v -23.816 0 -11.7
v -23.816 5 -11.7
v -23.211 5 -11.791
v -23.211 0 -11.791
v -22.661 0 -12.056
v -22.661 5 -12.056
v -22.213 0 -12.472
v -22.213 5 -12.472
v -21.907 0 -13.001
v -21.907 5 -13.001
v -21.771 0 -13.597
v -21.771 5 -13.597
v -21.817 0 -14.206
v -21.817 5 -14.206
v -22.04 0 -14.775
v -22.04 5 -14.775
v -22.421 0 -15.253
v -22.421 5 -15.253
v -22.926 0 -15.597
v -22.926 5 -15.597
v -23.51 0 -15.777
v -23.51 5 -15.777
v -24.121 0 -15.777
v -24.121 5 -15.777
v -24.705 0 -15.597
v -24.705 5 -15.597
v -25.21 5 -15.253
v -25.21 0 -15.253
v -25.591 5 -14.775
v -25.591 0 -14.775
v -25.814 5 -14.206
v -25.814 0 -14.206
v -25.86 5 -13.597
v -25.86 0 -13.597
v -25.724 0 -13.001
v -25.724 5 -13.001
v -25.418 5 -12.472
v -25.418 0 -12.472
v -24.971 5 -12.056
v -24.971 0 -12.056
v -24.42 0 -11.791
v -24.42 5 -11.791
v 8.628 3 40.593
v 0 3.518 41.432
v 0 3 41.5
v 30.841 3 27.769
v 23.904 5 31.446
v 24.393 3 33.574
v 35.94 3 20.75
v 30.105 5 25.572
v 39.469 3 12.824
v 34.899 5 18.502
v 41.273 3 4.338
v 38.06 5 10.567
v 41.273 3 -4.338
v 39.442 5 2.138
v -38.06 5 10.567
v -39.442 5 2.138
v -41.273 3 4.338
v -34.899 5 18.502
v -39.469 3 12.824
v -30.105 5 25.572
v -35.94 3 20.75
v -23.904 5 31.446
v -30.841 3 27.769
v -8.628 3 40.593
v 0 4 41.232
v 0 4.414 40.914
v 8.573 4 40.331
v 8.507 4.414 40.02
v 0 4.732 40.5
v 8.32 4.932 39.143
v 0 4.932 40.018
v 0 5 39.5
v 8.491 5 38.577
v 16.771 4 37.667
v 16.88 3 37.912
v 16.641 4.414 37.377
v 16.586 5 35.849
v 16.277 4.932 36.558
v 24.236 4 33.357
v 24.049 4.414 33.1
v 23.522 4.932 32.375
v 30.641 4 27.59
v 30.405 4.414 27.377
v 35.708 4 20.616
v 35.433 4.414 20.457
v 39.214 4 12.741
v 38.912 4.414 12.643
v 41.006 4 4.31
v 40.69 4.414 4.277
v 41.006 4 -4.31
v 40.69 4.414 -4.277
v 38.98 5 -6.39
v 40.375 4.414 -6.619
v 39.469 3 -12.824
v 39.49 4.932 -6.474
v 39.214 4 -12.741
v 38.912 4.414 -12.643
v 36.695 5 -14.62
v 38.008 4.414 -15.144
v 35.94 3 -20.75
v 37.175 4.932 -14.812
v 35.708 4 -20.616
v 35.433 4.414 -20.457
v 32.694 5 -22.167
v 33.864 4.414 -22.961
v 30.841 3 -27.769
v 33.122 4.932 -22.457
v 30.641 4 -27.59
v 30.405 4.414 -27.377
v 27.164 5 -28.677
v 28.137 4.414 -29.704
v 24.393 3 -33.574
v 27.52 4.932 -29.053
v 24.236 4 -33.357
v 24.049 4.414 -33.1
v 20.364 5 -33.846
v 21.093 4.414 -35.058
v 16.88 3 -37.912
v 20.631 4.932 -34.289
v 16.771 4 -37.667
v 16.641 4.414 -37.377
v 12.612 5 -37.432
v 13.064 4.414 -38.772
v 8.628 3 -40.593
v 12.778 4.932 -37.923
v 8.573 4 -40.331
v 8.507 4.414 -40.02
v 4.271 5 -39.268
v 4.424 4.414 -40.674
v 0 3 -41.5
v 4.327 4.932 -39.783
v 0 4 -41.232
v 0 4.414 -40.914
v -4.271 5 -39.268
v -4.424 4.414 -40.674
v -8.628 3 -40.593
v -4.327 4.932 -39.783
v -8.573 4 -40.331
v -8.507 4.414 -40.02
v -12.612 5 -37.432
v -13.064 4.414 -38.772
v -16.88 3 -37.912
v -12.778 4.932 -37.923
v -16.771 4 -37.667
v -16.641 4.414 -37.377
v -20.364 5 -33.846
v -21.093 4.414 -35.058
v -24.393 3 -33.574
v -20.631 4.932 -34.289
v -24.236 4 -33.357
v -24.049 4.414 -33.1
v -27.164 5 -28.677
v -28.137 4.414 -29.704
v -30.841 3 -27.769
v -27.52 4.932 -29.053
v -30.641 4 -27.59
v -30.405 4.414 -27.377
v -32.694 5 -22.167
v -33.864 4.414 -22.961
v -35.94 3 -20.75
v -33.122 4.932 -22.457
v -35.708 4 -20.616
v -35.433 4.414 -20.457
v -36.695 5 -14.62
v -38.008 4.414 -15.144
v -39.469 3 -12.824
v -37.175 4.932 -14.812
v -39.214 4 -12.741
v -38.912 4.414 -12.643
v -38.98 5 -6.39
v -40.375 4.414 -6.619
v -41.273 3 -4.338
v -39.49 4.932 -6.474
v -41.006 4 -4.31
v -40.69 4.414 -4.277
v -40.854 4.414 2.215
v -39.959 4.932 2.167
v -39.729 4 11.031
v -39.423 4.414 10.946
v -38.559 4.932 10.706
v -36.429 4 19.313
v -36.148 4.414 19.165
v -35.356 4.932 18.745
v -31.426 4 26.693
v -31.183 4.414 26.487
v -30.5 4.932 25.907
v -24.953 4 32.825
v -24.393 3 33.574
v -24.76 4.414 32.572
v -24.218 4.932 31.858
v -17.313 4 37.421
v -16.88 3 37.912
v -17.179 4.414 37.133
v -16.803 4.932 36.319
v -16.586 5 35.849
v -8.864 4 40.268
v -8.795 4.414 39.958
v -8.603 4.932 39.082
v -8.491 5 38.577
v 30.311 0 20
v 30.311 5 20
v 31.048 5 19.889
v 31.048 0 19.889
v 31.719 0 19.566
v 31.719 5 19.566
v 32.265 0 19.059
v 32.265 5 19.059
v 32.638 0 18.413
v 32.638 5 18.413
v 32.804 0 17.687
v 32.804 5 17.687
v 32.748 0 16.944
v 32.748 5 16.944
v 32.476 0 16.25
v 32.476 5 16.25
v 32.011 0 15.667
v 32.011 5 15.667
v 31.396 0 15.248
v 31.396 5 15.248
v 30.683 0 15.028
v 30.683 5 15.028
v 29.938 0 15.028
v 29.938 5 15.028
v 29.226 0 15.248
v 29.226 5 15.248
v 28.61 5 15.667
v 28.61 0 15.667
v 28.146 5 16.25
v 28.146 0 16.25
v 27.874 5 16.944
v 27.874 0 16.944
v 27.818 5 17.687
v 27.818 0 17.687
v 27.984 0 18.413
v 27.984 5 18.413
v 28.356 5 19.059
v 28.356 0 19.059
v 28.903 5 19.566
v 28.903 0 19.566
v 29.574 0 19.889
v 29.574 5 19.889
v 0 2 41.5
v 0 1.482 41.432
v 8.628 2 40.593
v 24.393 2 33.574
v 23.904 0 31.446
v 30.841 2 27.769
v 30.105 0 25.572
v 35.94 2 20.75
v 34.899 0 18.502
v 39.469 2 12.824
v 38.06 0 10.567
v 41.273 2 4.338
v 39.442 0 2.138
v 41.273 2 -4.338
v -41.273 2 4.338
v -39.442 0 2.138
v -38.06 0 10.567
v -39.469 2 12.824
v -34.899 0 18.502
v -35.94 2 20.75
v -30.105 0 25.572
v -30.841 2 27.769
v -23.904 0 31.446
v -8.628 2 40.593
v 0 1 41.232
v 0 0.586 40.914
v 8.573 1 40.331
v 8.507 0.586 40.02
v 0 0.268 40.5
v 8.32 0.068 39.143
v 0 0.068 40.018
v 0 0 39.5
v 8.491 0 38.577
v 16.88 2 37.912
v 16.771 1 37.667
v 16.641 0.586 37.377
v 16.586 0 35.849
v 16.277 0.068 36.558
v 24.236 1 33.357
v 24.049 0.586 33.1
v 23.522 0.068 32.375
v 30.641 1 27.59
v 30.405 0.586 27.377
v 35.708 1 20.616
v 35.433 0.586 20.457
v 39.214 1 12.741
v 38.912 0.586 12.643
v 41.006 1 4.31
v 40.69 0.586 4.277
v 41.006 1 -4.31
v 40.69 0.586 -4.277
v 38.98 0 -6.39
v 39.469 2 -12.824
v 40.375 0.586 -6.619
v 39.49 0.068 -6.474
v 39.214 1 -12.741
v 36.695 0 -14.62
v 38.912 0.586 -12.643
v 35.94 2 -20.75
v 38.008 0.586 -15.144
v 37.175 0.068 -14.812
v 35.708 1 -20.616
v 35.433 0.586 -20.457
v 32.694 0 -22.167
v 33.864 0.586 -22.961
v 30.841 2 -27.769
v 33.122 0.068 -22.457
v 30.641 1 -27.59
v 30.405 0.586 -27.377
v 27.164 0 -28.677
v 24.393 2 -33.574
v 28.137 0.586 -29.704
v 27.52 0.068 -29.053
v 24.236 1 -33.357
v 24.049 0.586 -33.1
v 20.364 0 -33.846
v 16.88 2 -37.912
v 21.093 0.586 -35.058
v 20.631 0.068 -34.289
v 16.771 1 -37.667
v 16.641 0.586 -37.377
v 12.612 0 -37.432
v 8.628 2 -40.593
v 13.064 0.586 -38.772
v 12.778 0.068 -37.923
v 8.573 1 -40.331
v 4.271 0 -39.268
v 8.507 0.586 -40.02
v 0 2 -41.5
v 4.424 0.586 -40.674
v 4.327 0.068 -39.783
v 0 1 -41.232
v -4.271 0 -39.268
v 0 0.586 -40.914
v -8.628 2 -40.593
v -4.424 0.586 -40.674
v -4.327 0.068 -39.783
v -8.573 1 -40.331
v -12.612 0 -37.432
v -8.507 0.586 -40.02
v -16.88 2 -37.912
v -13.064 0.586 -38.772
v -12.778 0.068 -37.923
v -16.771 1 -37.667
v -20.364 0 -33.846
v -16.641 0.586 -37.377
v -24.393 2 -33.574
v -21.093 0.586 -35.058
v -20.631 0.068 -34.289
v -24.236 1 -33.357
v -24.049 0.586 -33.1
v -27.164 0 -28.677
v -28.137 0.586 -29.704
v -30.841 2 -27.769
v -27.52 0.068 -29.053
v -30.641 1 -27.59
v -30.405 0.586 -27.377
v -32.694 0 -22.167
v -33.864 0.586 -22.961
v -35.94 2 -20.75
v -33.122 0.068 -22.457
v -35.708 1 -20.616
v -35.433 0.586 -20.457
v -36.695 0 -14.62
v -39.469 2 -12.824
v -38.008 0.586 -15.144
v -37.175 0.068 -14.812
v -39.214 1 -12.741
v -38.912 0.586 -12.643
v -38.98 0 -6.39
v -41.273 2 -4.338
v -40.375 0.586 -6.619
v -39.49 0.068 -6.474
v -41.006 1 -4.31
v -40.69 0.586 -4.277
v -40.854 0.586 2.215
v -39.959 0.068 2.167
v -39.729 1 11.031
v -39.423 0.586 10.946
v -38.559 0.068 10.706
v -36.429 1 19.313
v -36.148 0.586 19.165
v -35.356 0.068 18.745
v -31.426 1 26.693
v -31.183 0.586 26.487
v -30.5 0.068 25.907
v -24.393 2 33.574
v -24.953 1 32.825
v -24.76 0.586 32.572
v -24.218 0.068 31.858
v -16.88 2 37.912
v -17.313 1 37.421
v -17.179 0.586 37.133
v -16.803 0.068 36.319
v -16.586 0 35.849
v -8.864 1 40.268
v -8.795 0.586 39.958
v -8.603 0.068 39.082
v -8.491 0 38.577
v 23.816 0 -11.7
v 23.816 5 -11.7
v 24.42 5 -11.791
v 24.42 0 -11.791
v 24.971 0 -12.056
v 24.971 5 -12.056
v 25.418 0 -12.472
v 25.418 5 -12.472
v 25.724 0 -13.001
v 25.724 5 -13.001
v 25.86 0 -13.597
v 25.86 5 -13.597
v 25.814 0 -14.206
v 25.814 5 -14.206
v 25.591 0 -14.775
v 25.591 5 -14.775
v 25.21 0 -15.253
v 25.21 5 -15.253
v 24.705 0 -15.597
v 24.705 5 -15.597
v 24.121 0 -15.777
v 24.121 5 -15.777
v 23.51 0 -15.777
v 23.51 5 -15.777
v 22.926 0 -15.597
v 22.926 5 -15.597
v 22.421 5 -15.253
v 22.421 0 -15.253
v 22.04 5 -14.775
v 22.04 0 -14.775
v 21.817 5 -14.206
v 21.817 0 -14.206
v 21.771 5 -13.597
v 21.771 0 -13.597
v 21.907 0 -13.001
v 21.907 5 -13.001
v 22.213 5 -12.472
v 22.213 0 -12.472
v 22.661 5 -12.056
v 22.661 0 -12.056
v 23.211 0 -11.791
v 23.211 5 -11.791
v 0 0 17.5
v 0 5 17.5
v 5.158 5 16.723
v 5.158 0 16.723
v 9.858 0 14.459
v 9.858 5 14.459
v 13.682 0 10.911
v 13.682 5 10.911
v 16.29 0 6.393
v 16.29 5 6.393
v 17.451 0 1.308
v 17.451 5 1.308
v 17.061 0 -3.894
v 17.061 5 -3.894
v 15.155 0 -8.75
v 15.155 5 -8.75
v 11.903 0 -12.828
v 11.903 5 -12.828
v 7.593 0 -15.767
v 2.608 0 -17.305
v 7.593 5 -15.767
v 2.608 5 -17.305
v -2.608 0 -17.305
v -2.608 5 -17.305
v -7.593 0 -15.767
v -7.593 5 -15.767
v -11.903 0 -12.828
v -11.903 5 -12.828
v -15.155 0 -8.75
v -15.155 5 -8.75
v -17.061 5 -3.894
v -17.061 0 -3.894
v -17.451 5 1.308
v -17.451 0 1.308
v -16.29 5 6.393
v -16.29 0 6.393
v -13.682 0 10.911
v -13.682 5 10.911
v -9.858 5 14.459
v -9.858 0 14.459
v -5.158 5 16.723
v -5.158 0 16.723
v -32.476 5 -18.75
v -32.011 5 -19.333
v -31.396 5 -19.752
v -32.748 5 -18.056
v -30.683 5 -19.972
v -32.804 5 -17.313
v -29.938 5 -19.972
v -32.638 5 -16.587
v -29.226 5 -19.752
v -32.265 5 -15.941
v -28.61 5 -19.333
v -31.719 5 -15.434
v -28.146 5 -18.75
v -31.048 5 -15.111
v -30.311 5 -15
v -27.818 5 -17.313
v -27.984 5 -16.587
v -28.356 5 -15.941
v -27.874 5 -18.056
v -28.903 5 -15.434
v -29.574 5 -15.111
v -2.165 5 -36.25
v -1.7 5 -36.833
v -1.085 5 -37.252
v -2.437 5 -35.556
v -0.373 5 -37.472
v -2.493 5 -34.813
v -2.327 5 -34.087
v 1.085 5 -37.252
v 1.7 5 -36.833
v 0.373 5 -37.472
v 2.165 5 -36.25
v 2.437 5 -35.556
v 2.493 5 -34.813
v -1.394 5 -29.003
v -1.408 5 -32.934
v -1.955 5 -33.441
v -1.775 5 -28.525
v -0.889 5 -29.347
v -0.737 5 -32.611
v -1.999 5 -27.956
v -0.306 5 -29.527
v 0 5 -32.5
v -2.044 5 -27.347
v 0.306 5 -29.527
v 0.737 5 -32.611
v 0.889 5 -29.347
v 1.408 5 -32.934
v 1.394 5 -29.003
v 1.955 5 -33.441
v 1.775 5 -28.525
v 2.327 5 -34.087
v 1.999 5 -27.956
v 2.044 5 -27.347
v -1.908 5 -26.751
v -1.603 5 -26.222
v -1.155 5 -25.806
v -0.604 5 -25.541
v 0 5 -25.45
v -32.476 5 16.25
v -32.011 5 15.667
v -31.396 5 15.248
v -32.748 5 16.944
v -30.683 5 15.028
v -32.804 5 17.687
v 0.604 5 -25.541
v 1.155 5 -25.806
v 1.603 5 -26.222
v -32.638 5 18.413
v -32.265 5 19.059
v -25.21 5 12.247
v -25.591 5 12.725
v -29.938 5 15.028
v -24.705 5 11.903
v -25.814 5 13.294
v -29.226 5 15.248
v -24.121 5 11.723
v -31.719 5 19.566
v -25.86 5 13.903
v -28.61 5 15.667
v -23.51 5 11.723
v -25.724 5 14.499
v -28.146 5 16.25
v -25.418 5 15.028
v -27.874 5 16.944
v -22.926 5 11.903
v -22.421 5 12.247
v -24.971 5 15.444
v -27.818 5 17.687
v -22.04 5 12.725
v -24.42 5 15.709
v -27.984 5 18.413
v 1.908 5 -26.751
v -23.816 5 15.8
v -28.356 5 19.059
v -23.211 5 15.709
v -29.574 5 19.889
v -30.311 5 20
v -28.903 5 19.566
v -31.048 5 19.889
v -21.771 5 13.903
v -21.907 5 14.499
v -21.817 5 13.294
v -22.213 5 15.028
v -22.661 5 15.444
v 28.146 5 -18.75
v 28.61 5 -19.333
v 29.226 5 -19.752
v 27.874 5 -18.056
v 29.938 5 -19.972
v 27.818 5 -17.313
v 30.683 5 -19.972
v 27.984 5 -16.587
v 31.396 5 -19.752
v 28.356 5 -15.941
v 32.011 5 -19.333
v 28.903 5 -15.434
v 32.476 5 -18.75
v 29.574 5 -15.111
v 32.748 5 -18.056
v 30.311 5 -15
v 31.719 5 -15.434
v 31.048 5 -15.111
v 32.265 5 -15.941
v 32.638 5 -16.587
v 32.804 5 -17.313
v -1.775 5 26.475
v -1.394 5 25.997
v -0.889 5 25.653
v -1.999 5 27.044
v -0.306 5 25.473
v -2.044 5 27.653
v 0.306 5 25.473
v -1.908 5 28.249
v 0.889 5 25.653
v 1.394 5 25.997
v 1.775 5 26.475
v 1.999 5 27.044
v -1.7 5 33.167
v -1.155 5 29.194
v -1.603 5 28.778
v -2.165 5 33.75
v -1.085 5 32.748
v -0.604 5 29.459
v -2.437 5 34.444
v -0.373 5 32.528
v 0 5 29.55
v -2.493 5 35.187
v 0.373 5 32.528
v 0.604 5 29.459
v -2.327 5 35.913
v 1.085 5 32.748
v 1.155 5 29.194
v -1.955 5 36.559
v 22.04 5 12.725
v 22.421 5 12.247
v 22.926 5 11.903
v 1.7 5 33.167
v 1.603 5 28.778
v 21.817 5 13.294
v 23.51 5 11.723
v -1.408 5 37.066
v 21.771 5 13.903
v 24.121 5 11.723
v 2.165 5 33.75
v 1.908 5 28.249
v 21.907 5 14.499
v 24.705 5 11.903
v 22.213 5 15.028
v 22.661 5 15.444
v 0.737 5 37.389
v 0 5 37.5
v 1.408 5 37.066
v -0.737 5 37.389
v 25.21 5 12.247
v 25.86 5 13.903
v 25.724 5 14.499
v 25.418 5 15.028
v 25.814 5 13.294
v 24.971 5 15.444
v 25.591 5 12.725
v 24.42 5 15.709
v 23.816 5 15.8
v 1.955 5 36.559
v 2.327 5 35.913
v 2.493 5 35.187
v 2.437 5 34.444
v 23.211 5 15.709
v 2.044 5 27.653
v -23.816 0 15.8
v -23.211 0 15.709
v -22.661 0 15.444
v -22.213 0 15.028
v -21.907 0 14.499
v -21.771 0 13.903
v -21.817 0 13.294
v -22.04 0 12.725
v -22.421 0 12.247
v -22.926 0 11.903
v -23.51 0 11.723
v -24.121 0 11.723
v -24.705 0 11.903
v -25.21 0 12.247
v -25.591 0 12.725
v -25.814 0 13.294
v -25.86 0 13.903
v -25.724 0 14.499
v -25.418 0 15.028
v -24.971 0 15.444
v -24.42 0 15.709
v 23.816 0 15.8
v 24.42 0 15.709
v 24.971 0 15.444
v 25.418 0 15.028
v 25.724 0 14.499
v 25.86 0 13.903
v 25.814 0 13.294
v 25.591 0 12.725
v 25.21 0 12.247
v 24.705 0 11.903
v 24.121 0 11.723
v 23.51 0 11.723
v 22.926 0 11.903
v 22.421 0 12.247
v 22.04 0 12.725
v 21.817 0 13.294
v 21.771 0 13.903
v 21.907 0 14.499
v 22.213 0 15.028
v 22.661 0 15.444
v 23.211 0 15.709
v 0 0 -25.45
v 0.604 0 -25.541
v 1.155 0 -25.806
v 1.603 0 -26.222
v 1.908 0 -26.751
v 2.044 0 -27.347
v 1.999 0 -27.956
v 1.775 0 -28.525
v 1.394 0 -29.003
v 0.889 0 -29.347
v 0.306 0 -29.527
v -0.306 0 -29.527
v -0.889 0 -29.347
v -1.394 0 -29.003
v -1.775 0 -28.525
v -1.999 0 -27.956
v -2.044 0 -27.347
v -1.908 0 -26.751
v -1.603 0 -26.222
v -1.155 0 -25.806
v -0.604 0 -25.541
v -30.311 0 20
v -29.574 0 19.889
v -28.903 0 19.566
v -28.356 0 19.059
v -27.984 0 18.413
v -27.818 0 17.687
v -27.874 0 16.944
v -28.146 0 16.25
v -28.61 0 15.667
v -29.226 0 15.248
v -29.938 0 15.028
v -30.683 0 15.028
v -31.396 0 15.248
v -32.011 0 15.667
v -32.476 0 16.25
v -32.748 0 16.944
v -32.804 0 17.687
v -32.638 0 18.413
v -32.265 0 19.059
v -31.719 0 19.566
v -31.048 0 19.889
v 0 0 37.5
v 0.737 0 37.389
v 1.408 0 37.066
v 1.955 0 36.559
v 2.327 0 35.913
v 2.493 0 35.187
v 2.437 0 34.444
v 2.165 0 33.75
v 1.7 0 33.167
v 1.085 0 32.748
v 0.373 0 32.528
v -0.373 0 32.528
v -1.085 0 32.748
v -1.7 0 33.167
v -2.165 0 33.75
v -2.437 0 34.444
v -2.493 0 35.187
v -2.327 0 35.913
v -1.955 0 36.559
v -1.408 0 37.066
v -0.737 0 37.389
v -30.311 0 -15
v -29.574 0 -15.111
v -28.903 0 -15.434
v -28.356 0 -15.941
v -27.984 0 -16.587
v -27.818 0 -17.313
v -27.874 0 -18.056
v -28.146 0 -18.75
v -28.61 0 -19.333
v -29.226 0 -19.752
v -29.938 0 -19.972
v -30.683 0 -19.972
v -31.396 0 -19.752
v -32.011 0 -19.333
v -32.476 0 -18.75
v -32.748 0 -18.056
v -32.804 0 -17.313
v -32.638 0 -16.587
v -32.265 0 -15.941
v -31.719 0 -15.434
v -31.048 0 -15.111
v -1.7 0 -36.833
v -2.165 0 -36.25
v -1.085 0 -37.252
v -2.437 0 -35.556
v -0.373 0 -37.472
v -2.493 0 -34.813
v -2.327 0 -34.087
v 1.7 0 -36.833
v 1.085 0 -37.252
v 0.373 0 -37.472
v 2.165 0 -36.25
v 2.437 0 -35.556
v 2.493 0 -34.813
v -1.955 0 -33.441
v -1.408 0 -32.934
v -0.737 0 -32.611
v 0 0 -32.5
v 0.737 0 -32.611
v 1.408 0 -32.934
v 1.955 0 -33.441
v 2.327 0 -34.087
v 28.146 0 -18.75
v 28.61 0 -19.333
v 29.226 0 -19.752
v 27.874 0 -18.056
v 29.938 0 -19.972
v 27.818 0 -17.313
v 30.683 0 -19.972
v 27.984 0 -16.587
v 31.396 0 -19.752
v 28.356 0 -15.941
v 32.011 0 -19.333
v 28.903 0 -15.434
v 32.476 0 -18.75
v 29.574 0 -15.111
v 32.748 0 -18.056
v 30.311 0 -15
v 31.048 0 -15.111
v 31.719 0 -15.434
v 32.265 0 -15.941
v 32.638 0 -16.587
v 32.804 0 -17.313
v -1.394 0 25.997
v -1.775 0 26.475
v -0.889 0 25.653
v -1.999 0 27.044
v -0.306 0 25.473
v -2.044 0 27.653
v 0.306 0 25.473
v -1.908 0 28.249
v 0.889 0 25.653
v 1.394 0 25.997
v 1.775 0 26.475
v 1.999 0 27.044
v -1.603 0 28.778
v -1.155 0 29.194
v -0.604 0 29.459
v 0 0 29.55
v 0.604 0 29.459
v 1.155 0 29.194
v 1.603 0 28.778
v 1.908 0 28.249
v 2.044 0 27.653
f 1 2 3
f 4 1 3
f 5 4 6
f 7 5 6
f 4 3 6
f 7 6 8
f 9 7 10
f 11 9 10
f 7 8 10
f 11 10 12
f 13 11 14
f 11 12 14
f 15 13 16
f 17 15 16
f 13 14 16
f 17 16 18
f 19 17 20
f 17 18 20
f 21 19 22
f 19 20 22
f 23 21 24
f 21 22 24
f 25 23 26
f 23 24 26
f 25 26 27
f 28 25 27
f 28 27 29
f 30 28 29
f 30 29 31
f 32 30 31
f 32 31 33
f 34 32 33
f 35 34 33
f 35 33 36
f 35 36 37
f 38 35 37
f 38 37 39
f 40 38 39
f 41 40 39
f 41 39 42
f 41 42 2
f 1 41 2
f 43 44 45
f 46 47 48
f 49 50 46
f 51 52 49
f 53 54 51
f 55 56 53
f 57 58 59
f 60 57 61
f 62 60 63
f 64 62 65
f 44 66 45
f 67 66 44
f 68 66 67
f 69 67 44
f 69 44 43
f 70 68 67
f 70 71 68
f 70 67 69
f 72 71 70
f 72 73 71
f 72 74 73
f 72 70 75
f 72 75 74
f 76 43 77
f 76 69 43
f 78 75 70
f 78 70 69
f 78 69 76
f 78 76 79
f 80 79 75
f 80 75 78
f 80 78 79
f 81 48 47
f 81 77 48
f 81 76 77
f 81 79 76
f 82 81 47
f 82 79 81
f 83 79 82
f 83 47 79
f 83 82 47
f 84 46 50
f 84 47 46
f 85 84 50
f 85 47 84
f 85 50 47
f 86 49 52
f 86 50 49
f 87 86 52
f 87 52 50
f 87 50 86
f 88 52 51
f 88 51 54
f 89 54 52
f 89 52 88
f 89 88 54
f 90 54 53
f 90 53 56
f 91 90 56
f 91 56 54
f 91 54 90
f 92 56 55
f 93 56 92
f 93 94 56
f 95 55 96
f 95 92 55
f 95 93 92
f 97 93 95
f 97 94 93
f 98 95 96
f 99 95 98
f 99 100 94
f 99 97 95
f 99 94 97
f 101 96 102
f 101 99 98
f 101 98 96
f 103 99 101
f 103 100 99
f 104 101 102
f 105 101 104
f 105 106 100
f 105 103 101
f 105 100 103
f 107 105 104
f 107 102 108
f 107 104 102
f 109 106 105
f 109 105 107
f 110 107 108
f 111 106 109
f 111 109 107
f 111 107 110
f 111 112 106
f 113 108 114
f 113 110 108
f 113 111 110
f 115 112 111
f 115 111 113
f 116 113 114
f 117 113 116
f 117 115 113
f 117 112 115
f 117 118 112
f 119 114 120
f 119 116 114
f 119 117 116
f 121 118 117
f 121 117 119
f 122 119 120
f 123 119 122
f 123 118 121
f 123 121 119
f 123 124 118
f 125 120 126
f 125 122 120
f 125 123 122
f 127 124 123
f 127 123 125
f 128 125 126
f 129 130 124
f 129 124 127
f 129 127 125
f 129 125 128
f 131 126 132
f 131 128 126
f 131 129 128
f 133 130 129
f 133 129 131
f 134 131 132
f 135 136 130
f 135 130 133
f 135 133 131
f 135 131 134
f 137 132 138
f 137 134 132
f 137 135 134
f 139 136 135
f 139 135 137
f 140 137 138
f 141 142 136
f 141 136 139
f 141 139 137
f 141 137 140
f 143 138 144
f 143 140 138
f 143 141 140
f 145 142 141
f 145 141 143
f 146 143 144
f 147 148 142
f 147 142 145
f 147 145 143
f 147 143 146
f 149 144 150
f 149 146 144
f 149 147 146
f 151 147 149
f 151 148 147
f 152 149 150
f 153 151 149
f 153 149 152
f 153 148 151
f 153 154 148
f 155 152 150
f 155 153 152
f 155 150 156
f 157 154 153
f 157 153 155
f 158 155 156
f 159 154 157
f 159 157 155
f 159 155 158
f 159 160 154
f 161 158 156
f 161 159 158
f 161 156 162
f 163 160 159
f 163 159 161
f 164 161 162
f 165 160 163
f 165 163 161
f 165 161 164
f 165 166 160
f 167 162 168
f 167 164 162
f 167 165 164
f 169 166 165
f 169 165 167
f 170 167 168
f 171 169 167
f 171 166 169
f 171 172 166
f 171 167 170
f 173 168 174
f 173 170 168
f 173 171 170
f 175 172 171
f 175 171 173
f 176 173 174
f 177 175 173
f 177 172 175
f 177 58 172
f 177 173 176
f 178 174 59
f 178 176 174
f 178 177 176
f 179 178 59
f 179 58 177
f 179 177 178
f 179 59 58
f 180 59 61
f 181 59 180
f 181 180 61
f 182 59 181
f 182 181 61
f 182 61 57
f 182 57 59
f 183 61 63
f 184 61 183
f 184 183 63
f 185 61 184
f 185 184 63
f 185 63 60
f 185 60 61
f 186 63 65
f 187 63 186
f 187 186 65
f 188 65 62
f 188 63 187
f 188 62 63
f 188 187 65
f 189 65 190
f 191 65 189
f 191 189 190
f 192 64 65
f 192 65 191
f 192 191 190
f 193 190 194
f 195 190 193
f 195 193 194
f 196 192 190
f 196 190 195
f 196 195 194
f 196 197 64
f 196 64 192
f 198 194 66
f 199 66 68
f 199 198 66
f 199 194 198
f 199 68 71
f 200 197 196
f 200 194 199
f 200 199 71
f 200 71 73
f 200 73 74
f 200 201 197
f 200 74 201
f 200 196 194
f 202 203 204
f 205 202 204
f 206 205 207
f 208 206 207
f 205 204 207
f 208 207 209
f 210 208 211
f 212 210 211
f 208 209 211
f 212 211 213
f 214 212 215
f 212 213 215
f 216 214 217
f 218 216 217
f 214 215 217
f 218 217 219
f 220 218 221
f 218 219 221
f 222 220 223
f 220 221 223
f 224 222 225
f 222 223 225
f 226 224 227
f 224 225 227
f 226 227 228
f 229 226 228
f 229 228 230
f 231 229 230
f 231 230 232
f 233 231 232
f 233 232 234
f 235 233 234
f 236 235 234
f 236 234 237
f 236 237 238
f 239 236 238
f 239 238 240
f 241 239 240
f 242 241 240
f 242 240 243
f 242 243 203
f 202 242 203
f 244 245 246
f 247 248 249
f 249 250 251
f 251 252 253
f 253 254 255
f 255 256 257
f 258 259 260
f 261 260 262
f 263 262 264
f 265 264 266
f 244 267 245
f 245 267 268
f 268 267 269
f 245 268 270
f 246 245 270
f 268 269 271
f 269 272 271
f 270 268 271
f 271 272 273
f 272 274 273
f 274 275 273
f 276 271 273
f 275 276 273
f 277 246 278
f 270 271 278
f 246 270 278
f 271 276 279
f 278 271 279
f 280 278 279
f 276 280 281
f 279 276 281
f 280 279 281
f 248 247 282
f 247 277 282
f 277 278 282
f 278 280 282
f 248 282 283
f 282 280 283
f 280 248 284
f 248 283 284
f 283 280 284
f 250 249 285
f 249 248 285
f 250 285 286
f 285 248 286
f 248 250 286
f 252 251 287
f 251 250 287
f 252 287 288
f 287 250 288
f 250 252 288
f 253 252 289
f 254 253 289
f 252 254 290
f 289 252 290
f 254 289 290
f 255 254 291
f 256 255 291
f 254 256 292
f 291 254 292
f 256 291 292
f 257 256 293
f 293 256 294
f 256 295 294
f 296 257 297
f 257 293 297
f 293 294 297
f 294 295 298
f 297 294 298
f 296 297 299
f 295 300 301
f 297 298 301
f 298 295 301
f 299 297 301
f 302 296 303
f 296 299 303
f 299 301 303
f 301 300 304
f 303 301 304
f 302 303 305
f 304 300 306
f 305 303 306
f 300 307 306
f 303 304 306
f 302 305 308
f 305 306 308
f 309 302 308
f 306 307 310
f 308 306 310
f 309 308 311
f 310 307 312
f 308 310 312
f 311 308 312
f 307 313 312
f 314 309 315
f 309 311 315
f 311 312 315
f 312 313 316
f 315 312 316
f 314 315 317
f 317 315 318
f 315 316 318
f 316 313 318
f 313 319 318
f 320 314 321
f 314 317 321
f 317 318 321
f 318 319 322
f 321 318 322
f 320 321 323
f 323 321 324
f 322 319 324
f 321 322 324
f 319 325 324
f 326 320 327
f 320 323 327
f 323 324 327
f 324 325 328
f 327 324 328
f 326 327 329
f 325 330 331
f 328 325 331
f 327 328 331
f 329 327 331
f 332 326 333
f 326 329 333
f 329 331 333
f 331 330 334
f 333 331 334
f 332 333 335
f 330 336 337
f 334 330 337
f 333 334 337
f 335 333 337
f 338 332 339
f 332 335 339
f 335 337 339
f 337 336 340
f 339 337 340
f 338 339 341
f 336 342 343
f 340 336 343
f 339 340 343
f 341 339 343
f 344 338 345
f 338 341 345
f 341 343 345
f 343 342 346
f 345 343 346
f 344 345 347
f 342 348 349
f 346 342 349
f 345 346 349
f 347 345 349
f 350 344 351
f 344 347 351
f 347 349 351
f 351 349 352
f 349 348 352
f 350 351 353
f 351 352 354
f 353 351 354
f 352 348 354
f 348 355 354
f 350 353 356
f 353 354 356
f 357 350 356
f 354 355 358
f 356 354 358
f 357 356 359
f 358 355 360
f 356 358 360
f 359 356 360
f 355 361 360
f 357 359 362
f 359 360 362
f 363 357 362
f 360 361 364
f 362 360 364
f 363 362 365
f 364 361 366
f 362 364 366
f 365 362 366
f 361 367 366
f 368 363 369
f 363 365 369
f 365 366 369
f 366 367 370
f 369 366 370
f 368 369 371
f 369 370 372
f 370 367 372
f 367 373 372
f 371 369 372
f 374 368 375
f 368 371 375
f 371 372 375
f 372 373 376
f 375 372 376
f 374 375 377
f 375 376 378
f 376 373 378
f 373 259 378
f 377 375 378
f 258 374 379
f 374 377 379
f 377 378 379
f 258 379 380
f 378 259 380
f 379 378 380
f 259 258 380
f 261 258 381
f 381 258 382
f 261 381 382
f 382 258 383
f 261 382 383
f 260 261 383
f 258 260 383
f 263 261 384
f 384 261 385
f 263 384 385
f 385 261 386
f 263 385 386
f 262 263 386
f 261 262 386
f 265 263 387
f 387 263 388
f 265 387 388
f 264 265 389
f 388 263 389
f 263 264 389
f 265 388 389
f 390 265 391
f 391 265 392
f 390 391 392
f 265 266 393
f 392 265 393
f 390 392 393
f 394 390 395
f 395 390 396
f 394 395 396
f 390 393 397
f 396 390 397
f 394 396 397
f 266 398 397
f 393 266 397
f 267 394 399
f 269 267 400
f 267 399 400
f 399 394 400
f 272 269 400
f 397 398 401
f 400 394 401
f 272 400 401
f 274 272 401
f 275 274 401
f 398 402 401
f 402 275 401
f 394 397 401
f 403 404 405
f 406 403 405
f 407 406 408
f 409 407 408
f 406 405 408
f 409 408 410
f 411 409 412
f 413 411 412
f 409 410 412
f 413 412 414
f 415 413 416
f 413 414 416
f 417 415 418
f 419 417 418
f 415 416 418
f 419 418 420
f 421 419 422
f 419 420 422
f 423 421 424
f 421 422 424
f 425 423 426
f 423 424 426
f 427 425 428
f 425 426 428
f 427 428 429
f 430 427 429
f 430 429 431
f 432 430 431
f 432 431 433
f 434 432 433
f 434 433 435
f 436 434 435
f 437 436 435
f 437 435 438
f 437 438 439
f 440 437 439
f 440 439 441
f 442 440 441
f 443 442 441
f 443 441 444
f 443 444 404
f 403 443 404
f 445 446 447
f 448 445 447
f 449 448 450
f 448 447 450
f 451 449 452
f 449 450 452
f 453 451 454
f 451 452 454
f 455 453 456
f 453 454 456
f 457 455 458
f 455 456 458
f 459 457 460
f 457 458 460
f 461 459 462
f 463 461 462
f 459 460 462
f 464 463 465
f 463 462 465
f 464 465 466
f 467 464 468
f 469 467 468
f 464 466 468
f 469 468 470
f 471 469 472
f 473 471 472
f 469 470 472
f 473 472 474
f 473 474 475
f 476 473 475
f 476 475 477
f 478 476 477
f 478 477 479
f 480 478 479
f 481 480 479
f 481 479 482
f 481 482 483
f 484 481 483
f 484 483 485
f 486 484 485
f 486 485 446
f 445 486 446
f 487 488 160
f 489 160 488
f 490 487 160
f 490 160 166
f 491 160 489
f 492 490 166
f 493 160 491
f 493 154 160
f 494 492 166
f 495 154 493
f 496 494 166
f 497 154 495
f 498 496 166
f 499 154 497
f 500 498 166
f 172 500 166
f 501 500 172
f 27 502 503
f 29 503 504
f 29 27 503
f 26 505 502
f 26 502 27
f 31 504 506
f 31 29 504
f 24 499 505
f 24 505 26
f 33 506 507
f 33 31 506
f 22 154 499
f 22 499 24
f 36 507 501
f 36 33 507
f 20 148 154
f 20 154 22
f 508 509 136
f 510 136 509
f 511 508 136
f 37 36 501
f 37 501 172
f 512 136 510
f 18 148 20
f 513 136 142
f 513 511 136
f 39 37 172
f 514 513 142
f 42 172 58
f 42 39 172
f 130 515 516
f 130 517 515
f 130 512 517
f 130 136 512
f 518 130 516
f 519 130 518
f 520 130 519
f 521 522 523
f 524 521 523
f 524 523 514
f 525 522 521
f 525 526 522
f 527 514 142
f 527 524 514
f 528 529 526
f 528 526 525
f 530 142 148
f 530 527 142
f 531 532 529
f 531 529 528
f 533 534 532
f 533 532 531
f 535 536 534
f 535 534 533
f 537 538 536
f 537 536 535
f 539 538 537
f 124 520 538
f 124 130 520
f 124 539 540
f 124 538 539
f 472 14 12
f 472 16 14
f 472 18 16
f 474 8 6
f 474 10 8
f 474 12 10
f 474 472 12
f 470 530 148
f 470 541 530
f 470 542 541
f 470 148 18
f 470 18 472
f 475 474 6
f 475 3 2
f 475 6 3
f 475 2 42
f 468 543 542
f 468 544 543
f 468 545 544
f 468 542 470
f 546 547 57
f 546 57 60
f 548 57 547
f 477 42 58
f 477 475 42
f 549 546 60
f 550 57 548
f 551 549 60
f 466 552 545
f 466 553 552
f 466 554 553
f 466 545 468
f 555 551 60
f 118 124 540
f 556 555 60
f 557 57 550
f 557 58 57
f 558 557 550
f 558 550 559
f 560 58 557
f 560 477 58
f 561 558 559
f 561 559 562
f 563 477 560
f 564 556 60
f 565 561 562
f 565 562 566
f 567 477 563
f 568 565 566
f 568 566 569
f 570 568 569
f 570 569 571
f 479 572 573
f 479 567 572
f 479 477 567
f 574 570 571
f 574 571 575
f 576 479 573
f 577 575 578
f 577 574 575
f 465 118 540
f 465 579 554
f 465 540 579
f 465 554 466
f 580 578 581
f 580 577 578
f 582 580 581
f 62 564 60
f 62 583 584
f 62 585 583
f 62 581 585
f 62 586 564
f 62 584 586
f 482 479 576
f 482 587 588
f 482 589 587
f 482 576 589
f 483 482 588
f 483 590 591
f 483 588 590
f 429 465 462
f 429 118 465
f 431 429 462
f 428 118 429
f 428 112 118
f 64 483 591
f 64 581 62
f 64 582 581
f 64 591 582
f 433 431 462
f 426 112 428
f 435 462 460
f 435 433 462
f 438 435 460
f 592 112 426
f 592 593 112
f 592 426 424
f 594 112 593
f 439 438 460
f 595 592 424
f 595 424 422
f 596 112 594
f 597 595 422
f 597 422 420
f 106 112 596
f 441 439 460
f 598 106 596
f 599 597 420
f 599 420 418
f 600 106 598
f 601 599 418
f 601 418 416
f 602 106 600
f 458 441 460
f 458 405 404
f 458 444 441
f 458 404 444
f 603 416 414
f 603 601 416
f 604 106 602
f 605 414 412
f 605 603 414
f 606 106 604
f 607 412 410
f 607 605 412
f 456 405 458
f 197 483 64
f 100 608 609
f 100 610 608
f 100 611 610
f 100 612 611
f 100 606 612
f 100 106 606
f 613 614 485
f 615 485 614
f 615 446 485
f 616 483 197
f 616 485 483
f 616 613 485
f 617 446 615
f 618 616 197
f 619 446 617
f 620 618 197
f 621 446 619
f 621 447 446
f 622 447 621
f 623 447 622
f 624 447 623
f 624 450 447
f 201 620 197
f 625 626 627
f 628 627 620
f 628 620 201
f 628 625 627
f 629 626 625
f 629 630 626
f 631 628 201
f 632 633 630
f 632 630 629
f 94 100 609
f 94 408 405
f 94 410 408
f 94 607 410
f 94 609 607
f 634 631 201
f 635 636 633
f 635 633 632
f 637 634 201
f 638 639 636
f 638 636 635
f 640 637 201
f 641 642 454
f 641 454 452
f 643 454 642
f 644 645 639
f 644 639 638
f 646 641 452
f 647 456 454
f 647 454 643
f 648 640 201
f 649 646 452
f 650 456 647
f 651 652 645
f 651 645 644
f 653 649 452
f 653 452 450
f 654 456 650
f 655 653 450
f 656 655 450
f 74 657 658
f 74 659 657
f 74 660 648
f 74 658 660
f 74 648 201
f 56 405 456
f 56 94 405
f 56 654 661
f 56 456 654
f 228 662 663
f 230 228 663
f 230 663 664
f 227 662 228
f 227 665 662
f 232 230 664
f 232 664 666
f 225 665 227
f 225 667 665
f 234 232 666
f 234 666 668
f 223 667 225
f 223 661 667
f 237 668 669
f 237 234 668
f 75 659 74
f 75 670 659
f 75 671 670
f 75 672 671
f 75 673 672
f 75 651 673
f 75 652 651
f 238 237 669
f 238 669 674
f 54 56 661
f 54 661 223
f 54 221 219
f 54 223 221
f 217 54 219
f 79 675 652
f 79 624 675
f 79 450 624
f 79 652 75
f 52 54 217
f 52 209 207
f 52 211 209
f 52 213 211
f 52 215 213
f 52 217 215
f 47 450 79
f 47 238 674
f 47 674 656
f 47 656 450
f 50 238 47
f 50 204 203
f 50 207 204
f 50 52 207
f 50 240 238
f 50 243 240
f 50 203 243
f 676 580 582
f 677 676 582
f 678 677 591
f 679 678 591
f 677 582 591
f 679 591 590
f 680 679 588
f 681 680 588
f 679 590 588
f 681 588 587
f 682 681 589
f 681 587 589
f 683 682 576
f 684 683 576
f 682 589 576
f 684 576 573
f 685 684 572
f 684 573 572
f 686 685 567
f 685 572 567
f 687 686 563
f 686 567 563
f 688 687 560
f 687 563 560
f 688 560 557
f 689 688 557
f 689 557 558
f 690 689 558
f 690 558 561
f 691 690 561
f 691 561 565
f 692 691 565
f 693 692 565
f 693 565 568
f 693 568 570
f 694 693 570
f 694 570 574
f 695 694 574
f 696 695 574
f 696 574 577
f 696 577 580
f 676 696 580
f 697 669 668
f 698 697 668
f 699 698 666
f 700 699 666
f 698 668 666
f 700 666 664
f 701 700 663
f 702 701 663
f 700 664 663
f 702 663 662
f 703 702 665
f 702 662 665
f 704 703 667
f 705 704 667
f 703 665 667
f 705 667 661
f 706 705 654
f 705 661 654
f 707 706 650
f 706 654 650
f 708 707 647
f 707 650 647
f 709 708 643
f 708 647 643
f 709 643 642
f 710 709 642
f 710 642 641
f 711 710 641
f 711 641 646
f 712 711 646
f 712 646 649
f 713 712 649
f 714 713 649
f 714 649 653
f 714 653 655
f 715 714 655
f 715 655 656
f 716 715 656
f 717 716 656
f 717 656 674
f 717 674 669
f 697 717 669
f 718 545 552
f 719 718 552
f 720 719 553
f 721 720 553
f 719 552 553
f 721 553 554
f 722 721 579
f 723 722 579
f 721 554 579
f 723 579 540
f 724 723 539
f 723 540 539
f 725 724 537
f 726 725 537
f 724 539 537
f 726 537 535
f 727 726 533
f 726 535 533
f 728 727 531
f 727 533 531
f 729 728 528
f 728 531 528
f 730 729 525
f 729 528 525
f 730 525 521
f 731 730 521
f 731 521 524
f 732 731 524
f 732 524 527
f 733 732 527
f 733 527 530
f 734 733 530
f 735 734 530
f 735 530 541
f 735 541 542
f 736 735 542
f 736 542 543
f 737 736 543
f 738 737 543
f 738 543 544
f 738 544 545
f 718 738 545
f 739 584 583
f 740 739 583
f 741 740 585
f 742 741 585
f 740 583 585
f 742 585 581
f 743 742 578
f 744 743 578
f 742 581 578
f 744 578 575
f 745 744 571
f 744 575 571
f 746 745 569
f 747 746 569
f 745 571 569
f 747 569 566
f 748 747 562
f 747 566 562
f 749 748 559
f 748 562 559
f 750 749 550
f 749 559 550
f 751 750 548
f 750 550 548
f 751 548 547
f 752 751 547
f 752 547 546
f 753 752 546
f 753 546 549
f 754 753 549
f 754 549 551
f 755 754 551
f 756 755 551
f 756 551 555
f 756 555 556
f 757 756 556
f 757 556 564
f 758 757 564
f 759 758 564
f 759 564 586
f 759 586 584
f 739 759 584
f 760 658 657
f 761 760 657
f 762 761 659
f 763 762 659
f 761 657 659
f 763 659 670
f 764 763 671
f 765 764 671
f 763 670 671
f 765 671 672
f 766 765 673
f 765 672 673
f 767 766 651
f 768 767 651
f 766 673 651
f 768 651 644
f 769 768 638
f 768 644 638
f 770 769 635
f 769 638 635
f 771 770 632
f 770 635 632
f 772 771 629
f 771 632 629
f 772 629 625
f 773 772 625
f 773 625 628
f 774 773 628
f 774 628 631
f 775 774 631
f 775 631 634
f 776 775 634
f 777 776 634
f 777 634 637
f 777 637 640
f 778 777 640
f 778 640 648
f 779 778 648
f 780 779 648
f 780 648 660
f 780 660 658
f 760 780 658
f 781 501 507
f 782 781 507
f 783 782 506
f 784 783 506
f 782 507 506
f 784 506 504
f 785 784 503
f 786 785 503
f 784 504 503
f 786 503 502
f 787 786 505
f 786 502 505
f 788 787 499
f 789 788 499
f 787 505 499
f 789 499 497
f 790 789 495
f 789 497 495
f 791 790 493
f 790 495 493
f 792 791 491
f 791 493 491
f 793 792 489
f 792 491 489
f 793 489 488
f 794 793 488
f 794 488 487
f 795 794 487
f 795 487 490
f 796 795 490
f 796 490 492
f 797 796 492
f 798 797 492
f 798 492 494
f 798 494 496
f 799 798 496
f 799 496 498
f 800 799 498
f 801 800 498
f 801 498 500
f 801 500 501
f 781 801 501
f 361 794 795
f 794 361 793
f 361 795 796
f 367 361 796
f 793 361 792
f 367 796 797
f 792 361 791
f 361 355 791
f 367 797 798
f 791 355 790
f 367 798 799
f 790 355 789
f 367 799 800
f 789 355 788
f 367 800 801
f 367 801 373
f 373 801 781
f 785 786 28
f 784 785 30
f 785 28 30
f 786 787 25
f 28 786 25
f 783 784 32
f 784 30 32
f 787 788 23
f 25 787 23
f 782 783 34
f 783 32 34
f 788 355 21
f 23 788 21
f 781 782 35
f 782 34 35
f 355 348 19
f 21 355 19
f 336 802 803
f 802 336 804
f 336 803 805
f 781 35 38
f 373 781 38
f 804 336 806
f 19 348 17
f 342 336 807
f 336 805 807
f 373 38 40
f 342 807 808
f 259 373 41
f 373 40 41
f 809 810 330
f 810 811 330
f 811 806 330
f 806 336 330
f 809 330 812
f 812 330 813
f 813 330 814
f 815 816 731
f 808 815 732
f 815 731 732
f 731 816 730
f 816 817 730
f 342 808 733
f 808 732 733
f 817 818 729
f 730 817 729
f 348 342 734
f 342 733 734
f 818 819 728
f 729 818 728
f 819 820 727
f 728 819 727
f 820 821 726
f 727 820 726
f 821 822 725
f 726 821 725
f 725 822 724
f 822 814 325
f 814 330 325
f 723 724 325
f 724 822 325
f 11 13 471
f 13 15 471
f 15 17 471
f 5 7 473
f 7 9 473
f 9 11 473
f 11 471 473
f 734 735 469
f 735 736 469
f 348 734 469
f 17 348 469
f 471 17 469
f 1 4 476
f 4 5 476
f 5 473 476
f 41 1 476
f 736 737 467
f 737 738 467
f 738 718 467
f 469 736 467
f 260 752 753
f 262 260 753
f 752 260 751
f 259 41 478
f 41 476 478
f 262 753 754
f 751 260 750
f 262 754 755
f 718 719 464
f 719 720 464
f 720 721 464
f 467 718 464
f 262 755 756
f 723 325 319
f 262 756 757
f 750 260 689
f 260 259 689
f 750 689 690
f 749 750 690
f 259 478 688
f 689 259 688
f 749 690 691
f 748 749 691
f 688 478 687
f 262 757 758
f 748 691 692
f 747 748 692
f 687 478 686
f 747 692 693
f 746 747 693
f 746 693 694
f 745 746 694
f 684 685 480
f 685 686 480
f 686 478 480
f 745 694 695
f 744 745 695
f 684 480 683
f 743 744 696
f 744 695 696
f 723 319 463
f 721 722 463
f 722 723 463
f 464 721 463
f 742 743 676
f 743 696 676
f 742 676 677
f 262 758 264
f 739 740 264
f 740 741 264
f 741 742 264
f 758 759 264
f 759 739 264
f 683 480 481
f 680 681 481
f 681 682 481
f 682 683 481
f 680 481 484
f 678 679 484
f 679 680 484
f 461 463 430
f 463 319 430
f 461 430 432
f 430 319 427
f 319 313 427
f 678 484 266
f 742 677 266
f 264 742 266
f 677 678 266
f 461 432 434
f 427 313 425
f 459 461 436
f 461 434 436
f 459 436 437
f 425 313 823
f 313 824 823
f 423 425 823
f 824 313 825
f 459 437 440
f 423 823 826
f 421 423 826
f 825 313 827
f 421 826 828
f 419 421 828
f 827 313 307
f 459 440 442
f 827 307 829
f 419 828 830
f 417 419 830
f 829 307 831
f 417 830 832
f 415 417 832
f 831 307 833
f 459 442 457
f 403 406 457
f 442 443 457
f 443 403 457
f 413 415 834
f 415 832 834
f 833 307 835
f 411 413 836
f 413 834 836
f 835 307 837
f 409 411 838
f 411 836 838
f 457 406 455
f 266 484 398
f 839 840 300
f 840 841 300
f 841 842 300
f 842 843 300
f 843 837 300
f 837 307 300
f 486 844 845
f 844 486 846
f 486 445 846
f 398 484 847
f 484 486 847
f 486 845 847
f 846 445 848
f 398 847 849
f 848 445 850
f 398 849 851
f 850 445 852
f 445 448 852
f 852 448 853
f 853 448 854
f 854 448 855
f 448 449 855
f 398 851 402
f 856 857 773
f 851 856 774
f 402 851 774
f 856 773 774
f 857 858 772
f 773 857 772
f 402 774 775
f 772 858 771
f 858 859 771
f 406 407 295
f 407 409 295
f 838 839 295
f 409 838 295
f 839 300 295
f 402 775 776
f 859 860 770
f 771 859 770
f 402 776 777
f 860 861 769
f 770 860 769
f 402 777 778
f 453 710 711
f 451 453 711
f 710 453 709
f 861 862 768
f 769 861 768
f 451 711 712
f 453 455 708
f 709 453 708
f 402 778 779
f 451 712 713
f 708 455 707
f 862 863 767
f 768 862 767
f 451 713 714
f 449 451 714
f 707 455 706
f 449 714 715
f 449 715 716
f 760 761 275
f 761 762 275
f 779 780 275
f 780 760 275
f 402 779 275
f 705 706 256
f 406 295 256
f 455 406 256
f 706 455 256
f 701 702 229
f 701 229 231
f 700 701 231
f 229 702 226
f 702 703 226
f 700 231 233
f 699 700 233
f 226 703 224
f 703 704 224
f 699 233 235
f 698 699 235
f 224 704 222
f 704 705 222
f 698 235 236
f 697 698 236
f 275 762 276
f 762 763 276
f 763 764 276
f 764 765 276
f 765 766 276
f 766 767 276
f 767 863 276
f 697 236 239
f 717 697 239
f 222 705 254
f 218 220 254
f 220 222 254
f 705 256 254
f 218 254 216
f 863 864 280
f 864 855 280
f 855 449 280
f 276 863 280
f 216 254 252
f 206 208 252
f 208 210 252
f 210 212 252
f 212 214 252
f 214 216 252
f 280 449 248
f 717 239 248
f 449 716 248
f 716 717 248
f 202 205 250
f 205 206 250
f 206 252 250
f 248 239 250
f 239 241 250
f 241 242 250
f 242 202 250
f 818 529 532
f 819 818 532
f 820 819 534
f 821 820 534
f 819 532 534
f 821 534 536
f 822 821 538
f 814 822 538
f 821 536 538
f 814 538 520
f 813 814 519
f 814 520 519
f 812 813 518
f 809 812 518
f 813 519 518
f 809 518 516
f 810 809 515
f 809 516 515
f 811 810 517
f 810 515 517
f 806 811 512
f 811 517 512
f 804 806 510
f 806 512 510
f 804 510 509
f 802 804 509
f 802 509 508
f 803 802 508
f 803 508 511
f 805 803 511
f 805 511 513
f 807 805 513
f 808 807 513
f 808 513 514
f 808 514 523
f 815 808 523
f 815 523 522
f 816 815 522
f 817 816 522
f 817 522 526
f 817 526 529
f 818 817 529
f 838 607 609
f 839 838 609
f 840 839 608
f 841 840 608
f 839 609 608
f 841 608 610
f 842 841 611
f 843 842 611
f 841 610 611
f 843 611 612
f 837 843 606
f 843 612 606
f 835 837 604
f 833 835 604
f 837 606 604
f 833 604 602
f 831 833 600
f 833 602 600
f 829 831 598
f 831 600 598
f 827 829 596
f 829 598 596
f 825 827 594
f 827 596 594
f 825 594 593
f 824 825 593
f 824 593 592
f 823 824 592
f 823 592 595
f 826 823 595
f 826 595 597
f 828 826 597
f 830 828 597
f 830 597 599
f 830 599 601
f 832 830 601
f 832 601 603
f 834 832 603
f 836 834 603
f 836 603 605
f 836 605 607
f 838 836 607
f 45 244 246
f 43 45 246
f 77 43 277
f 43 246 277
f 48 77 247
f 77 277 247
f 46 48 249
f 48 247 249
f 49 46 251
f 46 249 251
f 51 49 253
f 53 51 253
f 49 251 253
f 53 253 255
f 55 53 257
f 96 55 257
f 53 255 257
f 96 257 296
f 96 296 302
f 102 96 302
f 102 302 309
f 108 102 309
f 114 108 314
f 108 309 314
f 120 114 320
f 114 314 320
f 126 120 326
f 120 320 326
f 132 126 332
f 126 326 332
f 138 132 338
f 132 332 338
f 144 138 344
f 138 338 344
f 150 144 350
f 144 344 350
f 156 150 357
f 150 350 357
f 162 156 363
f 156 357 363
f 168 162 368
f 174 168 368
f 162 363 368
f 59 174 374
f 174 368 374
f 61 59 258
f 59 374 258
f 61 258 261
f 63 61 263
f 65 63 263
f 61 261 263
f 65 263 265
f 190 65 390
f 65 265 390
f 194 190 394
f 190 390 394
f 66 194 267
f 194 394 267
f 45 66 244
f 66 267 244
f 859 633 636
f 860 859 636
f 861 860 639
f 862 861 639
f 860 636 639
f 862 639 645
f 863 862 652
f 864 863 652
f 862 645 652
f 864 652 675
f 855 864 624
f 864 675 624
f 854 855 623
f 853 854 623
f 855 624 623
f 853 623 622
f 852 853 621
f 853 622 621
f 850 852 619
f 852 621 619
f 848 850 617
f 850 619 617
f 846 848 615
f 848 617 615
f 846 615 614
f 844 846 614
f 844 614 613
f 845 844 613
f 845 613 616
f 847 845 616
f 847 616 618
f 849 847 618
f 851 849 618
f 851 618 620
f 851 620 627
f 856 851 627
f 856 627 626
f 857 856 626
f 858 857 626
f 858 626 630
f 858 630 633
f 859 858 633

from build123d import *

# Parameters (mm, degrees)
SKETCH1_R             = 41.5
MAIN_PLATE_DEPTH      = 5
SKETCH2_R             = 2.05
CUT_EXTRUDE_G27_DEPTH = 59.902461748
SKETCH3_R             = 2.5
MOMO_SPARKO_DEPTH     = 59.902461748
SKETCH4_R             = 17.5
CENTER_HOLE_DEPTH     = 59.902461748
FILLET1_R             = 2
FILLET2_R             = 2


with BuildPart() as part:
    # Sketch1 → Main Plate (new body)
    with BuildSketch(Plane(origin=(0, 0, 0), x_dir=(1, 0, 0), z_dir=(0, 1, 0))):
        with Locations(Location((0, 0, 0), (0, 0, 270))):
            Circle(SKETCH1_R)
    extrude(amount=MAIN_PLATE_DEPTH)

    # Sketch2 → Cut-Extrude G27 (cut, through all)
    with BuildSketch(Plane(origin=(0, 5, 0), x_dir=(1, 0, 0), z_dir=(0, 1, 0))):
        with Locations(Location((0, 27.5, 0), (0, 0, 270))):
            Circle(SKETCH2_R)
        with Locations(Location((23.815698604, 13.75, 0), (0, 0, 270))):
            Circle(SKETCH2_R)
        with Locations(Location((23.815698604, -13.75, 0), (0, 0, 270))):
            Circle(SKETCH2_R)
        with Locations(Location((0, -27.5, 0), (0, 0, 270))):
            Circle(SKETCH2_R)
        with Locations(Location((-23.815698604, -13.75, 0), (0, 0, 270))):
            Circle(SKETCH2_R)
        with Locations(Location((-23.815698604, 13.75, 0), (0, 0, 270))):
            Circle(SKETCH2_R)
    extrude(amount=-CUT_EXTRUDE_G27_DEPTH, mode=Mode.SUBTRACT)

    # Sketch3 → Momo - Sparko (cut, through all)
    with BuildSketch(Plane(origin=(0, 5, 0), x_dir=(1, 0, 0), z_dir=(0, 1, 0))):
        with Locations(Location((0, 35, 0), (0, 0, 270))):
            Circle(SKETCH3_R)
        with Locations(Location((30.310889132, 17.5, 0), (0, 0, 270))):
            Circle(SKETCH3_R)
        with Locations(Location((30.310889132, -17.5, 0), (0, 0, 270))):
            Circle(SKETCH3_R)
        with Locations(Location((0, -35, 0), (0, 0, 270))):
            Circle(SKETCH3_R)
        with Locations(Location((-30.310889132, -17.5, 0), (0, 0, 270))):
            Circle(SKETCH3_R)
        with Locations(Location((-30.310889132, 17.5, 0), (0, 0, 270))):
            Circle(SKETCH3_R)
    extrude(amount=-MOMO_SPARKO_DEPTH, mode=Mode.SUBTRACT)

    # Sketch4 → Center Hole (cut, through all)
    with BuildSketch(Plane(origin=(0, 5, 0), x_dir=(1, 0, 0), z_dir=(0, 1, 0))):
        with Locations(Location((0, 0, 0), (0, 0, 270))):
            Circle(SKETCH4_R)
    extrude(amount=-CENTER_HOLE_DEPTH, mode=Mode.SUBTRACT)

    # Fillet1
    fillet1_edges = [part.edges().sort_by_distance(p)[0] for p in [
        (0, 5, -41.5),
    ]]
    fillet(fillet1_edges, radius=FILLET1_R)

    # Fillet2
    fillet2_edges = [part.edges().sort_by_distance(p)[0] for p in [
        (0, 0, -41.5),
    ]]
    fillet(fillet2_edges, radius=FILLET2_R)


solid = part.part
